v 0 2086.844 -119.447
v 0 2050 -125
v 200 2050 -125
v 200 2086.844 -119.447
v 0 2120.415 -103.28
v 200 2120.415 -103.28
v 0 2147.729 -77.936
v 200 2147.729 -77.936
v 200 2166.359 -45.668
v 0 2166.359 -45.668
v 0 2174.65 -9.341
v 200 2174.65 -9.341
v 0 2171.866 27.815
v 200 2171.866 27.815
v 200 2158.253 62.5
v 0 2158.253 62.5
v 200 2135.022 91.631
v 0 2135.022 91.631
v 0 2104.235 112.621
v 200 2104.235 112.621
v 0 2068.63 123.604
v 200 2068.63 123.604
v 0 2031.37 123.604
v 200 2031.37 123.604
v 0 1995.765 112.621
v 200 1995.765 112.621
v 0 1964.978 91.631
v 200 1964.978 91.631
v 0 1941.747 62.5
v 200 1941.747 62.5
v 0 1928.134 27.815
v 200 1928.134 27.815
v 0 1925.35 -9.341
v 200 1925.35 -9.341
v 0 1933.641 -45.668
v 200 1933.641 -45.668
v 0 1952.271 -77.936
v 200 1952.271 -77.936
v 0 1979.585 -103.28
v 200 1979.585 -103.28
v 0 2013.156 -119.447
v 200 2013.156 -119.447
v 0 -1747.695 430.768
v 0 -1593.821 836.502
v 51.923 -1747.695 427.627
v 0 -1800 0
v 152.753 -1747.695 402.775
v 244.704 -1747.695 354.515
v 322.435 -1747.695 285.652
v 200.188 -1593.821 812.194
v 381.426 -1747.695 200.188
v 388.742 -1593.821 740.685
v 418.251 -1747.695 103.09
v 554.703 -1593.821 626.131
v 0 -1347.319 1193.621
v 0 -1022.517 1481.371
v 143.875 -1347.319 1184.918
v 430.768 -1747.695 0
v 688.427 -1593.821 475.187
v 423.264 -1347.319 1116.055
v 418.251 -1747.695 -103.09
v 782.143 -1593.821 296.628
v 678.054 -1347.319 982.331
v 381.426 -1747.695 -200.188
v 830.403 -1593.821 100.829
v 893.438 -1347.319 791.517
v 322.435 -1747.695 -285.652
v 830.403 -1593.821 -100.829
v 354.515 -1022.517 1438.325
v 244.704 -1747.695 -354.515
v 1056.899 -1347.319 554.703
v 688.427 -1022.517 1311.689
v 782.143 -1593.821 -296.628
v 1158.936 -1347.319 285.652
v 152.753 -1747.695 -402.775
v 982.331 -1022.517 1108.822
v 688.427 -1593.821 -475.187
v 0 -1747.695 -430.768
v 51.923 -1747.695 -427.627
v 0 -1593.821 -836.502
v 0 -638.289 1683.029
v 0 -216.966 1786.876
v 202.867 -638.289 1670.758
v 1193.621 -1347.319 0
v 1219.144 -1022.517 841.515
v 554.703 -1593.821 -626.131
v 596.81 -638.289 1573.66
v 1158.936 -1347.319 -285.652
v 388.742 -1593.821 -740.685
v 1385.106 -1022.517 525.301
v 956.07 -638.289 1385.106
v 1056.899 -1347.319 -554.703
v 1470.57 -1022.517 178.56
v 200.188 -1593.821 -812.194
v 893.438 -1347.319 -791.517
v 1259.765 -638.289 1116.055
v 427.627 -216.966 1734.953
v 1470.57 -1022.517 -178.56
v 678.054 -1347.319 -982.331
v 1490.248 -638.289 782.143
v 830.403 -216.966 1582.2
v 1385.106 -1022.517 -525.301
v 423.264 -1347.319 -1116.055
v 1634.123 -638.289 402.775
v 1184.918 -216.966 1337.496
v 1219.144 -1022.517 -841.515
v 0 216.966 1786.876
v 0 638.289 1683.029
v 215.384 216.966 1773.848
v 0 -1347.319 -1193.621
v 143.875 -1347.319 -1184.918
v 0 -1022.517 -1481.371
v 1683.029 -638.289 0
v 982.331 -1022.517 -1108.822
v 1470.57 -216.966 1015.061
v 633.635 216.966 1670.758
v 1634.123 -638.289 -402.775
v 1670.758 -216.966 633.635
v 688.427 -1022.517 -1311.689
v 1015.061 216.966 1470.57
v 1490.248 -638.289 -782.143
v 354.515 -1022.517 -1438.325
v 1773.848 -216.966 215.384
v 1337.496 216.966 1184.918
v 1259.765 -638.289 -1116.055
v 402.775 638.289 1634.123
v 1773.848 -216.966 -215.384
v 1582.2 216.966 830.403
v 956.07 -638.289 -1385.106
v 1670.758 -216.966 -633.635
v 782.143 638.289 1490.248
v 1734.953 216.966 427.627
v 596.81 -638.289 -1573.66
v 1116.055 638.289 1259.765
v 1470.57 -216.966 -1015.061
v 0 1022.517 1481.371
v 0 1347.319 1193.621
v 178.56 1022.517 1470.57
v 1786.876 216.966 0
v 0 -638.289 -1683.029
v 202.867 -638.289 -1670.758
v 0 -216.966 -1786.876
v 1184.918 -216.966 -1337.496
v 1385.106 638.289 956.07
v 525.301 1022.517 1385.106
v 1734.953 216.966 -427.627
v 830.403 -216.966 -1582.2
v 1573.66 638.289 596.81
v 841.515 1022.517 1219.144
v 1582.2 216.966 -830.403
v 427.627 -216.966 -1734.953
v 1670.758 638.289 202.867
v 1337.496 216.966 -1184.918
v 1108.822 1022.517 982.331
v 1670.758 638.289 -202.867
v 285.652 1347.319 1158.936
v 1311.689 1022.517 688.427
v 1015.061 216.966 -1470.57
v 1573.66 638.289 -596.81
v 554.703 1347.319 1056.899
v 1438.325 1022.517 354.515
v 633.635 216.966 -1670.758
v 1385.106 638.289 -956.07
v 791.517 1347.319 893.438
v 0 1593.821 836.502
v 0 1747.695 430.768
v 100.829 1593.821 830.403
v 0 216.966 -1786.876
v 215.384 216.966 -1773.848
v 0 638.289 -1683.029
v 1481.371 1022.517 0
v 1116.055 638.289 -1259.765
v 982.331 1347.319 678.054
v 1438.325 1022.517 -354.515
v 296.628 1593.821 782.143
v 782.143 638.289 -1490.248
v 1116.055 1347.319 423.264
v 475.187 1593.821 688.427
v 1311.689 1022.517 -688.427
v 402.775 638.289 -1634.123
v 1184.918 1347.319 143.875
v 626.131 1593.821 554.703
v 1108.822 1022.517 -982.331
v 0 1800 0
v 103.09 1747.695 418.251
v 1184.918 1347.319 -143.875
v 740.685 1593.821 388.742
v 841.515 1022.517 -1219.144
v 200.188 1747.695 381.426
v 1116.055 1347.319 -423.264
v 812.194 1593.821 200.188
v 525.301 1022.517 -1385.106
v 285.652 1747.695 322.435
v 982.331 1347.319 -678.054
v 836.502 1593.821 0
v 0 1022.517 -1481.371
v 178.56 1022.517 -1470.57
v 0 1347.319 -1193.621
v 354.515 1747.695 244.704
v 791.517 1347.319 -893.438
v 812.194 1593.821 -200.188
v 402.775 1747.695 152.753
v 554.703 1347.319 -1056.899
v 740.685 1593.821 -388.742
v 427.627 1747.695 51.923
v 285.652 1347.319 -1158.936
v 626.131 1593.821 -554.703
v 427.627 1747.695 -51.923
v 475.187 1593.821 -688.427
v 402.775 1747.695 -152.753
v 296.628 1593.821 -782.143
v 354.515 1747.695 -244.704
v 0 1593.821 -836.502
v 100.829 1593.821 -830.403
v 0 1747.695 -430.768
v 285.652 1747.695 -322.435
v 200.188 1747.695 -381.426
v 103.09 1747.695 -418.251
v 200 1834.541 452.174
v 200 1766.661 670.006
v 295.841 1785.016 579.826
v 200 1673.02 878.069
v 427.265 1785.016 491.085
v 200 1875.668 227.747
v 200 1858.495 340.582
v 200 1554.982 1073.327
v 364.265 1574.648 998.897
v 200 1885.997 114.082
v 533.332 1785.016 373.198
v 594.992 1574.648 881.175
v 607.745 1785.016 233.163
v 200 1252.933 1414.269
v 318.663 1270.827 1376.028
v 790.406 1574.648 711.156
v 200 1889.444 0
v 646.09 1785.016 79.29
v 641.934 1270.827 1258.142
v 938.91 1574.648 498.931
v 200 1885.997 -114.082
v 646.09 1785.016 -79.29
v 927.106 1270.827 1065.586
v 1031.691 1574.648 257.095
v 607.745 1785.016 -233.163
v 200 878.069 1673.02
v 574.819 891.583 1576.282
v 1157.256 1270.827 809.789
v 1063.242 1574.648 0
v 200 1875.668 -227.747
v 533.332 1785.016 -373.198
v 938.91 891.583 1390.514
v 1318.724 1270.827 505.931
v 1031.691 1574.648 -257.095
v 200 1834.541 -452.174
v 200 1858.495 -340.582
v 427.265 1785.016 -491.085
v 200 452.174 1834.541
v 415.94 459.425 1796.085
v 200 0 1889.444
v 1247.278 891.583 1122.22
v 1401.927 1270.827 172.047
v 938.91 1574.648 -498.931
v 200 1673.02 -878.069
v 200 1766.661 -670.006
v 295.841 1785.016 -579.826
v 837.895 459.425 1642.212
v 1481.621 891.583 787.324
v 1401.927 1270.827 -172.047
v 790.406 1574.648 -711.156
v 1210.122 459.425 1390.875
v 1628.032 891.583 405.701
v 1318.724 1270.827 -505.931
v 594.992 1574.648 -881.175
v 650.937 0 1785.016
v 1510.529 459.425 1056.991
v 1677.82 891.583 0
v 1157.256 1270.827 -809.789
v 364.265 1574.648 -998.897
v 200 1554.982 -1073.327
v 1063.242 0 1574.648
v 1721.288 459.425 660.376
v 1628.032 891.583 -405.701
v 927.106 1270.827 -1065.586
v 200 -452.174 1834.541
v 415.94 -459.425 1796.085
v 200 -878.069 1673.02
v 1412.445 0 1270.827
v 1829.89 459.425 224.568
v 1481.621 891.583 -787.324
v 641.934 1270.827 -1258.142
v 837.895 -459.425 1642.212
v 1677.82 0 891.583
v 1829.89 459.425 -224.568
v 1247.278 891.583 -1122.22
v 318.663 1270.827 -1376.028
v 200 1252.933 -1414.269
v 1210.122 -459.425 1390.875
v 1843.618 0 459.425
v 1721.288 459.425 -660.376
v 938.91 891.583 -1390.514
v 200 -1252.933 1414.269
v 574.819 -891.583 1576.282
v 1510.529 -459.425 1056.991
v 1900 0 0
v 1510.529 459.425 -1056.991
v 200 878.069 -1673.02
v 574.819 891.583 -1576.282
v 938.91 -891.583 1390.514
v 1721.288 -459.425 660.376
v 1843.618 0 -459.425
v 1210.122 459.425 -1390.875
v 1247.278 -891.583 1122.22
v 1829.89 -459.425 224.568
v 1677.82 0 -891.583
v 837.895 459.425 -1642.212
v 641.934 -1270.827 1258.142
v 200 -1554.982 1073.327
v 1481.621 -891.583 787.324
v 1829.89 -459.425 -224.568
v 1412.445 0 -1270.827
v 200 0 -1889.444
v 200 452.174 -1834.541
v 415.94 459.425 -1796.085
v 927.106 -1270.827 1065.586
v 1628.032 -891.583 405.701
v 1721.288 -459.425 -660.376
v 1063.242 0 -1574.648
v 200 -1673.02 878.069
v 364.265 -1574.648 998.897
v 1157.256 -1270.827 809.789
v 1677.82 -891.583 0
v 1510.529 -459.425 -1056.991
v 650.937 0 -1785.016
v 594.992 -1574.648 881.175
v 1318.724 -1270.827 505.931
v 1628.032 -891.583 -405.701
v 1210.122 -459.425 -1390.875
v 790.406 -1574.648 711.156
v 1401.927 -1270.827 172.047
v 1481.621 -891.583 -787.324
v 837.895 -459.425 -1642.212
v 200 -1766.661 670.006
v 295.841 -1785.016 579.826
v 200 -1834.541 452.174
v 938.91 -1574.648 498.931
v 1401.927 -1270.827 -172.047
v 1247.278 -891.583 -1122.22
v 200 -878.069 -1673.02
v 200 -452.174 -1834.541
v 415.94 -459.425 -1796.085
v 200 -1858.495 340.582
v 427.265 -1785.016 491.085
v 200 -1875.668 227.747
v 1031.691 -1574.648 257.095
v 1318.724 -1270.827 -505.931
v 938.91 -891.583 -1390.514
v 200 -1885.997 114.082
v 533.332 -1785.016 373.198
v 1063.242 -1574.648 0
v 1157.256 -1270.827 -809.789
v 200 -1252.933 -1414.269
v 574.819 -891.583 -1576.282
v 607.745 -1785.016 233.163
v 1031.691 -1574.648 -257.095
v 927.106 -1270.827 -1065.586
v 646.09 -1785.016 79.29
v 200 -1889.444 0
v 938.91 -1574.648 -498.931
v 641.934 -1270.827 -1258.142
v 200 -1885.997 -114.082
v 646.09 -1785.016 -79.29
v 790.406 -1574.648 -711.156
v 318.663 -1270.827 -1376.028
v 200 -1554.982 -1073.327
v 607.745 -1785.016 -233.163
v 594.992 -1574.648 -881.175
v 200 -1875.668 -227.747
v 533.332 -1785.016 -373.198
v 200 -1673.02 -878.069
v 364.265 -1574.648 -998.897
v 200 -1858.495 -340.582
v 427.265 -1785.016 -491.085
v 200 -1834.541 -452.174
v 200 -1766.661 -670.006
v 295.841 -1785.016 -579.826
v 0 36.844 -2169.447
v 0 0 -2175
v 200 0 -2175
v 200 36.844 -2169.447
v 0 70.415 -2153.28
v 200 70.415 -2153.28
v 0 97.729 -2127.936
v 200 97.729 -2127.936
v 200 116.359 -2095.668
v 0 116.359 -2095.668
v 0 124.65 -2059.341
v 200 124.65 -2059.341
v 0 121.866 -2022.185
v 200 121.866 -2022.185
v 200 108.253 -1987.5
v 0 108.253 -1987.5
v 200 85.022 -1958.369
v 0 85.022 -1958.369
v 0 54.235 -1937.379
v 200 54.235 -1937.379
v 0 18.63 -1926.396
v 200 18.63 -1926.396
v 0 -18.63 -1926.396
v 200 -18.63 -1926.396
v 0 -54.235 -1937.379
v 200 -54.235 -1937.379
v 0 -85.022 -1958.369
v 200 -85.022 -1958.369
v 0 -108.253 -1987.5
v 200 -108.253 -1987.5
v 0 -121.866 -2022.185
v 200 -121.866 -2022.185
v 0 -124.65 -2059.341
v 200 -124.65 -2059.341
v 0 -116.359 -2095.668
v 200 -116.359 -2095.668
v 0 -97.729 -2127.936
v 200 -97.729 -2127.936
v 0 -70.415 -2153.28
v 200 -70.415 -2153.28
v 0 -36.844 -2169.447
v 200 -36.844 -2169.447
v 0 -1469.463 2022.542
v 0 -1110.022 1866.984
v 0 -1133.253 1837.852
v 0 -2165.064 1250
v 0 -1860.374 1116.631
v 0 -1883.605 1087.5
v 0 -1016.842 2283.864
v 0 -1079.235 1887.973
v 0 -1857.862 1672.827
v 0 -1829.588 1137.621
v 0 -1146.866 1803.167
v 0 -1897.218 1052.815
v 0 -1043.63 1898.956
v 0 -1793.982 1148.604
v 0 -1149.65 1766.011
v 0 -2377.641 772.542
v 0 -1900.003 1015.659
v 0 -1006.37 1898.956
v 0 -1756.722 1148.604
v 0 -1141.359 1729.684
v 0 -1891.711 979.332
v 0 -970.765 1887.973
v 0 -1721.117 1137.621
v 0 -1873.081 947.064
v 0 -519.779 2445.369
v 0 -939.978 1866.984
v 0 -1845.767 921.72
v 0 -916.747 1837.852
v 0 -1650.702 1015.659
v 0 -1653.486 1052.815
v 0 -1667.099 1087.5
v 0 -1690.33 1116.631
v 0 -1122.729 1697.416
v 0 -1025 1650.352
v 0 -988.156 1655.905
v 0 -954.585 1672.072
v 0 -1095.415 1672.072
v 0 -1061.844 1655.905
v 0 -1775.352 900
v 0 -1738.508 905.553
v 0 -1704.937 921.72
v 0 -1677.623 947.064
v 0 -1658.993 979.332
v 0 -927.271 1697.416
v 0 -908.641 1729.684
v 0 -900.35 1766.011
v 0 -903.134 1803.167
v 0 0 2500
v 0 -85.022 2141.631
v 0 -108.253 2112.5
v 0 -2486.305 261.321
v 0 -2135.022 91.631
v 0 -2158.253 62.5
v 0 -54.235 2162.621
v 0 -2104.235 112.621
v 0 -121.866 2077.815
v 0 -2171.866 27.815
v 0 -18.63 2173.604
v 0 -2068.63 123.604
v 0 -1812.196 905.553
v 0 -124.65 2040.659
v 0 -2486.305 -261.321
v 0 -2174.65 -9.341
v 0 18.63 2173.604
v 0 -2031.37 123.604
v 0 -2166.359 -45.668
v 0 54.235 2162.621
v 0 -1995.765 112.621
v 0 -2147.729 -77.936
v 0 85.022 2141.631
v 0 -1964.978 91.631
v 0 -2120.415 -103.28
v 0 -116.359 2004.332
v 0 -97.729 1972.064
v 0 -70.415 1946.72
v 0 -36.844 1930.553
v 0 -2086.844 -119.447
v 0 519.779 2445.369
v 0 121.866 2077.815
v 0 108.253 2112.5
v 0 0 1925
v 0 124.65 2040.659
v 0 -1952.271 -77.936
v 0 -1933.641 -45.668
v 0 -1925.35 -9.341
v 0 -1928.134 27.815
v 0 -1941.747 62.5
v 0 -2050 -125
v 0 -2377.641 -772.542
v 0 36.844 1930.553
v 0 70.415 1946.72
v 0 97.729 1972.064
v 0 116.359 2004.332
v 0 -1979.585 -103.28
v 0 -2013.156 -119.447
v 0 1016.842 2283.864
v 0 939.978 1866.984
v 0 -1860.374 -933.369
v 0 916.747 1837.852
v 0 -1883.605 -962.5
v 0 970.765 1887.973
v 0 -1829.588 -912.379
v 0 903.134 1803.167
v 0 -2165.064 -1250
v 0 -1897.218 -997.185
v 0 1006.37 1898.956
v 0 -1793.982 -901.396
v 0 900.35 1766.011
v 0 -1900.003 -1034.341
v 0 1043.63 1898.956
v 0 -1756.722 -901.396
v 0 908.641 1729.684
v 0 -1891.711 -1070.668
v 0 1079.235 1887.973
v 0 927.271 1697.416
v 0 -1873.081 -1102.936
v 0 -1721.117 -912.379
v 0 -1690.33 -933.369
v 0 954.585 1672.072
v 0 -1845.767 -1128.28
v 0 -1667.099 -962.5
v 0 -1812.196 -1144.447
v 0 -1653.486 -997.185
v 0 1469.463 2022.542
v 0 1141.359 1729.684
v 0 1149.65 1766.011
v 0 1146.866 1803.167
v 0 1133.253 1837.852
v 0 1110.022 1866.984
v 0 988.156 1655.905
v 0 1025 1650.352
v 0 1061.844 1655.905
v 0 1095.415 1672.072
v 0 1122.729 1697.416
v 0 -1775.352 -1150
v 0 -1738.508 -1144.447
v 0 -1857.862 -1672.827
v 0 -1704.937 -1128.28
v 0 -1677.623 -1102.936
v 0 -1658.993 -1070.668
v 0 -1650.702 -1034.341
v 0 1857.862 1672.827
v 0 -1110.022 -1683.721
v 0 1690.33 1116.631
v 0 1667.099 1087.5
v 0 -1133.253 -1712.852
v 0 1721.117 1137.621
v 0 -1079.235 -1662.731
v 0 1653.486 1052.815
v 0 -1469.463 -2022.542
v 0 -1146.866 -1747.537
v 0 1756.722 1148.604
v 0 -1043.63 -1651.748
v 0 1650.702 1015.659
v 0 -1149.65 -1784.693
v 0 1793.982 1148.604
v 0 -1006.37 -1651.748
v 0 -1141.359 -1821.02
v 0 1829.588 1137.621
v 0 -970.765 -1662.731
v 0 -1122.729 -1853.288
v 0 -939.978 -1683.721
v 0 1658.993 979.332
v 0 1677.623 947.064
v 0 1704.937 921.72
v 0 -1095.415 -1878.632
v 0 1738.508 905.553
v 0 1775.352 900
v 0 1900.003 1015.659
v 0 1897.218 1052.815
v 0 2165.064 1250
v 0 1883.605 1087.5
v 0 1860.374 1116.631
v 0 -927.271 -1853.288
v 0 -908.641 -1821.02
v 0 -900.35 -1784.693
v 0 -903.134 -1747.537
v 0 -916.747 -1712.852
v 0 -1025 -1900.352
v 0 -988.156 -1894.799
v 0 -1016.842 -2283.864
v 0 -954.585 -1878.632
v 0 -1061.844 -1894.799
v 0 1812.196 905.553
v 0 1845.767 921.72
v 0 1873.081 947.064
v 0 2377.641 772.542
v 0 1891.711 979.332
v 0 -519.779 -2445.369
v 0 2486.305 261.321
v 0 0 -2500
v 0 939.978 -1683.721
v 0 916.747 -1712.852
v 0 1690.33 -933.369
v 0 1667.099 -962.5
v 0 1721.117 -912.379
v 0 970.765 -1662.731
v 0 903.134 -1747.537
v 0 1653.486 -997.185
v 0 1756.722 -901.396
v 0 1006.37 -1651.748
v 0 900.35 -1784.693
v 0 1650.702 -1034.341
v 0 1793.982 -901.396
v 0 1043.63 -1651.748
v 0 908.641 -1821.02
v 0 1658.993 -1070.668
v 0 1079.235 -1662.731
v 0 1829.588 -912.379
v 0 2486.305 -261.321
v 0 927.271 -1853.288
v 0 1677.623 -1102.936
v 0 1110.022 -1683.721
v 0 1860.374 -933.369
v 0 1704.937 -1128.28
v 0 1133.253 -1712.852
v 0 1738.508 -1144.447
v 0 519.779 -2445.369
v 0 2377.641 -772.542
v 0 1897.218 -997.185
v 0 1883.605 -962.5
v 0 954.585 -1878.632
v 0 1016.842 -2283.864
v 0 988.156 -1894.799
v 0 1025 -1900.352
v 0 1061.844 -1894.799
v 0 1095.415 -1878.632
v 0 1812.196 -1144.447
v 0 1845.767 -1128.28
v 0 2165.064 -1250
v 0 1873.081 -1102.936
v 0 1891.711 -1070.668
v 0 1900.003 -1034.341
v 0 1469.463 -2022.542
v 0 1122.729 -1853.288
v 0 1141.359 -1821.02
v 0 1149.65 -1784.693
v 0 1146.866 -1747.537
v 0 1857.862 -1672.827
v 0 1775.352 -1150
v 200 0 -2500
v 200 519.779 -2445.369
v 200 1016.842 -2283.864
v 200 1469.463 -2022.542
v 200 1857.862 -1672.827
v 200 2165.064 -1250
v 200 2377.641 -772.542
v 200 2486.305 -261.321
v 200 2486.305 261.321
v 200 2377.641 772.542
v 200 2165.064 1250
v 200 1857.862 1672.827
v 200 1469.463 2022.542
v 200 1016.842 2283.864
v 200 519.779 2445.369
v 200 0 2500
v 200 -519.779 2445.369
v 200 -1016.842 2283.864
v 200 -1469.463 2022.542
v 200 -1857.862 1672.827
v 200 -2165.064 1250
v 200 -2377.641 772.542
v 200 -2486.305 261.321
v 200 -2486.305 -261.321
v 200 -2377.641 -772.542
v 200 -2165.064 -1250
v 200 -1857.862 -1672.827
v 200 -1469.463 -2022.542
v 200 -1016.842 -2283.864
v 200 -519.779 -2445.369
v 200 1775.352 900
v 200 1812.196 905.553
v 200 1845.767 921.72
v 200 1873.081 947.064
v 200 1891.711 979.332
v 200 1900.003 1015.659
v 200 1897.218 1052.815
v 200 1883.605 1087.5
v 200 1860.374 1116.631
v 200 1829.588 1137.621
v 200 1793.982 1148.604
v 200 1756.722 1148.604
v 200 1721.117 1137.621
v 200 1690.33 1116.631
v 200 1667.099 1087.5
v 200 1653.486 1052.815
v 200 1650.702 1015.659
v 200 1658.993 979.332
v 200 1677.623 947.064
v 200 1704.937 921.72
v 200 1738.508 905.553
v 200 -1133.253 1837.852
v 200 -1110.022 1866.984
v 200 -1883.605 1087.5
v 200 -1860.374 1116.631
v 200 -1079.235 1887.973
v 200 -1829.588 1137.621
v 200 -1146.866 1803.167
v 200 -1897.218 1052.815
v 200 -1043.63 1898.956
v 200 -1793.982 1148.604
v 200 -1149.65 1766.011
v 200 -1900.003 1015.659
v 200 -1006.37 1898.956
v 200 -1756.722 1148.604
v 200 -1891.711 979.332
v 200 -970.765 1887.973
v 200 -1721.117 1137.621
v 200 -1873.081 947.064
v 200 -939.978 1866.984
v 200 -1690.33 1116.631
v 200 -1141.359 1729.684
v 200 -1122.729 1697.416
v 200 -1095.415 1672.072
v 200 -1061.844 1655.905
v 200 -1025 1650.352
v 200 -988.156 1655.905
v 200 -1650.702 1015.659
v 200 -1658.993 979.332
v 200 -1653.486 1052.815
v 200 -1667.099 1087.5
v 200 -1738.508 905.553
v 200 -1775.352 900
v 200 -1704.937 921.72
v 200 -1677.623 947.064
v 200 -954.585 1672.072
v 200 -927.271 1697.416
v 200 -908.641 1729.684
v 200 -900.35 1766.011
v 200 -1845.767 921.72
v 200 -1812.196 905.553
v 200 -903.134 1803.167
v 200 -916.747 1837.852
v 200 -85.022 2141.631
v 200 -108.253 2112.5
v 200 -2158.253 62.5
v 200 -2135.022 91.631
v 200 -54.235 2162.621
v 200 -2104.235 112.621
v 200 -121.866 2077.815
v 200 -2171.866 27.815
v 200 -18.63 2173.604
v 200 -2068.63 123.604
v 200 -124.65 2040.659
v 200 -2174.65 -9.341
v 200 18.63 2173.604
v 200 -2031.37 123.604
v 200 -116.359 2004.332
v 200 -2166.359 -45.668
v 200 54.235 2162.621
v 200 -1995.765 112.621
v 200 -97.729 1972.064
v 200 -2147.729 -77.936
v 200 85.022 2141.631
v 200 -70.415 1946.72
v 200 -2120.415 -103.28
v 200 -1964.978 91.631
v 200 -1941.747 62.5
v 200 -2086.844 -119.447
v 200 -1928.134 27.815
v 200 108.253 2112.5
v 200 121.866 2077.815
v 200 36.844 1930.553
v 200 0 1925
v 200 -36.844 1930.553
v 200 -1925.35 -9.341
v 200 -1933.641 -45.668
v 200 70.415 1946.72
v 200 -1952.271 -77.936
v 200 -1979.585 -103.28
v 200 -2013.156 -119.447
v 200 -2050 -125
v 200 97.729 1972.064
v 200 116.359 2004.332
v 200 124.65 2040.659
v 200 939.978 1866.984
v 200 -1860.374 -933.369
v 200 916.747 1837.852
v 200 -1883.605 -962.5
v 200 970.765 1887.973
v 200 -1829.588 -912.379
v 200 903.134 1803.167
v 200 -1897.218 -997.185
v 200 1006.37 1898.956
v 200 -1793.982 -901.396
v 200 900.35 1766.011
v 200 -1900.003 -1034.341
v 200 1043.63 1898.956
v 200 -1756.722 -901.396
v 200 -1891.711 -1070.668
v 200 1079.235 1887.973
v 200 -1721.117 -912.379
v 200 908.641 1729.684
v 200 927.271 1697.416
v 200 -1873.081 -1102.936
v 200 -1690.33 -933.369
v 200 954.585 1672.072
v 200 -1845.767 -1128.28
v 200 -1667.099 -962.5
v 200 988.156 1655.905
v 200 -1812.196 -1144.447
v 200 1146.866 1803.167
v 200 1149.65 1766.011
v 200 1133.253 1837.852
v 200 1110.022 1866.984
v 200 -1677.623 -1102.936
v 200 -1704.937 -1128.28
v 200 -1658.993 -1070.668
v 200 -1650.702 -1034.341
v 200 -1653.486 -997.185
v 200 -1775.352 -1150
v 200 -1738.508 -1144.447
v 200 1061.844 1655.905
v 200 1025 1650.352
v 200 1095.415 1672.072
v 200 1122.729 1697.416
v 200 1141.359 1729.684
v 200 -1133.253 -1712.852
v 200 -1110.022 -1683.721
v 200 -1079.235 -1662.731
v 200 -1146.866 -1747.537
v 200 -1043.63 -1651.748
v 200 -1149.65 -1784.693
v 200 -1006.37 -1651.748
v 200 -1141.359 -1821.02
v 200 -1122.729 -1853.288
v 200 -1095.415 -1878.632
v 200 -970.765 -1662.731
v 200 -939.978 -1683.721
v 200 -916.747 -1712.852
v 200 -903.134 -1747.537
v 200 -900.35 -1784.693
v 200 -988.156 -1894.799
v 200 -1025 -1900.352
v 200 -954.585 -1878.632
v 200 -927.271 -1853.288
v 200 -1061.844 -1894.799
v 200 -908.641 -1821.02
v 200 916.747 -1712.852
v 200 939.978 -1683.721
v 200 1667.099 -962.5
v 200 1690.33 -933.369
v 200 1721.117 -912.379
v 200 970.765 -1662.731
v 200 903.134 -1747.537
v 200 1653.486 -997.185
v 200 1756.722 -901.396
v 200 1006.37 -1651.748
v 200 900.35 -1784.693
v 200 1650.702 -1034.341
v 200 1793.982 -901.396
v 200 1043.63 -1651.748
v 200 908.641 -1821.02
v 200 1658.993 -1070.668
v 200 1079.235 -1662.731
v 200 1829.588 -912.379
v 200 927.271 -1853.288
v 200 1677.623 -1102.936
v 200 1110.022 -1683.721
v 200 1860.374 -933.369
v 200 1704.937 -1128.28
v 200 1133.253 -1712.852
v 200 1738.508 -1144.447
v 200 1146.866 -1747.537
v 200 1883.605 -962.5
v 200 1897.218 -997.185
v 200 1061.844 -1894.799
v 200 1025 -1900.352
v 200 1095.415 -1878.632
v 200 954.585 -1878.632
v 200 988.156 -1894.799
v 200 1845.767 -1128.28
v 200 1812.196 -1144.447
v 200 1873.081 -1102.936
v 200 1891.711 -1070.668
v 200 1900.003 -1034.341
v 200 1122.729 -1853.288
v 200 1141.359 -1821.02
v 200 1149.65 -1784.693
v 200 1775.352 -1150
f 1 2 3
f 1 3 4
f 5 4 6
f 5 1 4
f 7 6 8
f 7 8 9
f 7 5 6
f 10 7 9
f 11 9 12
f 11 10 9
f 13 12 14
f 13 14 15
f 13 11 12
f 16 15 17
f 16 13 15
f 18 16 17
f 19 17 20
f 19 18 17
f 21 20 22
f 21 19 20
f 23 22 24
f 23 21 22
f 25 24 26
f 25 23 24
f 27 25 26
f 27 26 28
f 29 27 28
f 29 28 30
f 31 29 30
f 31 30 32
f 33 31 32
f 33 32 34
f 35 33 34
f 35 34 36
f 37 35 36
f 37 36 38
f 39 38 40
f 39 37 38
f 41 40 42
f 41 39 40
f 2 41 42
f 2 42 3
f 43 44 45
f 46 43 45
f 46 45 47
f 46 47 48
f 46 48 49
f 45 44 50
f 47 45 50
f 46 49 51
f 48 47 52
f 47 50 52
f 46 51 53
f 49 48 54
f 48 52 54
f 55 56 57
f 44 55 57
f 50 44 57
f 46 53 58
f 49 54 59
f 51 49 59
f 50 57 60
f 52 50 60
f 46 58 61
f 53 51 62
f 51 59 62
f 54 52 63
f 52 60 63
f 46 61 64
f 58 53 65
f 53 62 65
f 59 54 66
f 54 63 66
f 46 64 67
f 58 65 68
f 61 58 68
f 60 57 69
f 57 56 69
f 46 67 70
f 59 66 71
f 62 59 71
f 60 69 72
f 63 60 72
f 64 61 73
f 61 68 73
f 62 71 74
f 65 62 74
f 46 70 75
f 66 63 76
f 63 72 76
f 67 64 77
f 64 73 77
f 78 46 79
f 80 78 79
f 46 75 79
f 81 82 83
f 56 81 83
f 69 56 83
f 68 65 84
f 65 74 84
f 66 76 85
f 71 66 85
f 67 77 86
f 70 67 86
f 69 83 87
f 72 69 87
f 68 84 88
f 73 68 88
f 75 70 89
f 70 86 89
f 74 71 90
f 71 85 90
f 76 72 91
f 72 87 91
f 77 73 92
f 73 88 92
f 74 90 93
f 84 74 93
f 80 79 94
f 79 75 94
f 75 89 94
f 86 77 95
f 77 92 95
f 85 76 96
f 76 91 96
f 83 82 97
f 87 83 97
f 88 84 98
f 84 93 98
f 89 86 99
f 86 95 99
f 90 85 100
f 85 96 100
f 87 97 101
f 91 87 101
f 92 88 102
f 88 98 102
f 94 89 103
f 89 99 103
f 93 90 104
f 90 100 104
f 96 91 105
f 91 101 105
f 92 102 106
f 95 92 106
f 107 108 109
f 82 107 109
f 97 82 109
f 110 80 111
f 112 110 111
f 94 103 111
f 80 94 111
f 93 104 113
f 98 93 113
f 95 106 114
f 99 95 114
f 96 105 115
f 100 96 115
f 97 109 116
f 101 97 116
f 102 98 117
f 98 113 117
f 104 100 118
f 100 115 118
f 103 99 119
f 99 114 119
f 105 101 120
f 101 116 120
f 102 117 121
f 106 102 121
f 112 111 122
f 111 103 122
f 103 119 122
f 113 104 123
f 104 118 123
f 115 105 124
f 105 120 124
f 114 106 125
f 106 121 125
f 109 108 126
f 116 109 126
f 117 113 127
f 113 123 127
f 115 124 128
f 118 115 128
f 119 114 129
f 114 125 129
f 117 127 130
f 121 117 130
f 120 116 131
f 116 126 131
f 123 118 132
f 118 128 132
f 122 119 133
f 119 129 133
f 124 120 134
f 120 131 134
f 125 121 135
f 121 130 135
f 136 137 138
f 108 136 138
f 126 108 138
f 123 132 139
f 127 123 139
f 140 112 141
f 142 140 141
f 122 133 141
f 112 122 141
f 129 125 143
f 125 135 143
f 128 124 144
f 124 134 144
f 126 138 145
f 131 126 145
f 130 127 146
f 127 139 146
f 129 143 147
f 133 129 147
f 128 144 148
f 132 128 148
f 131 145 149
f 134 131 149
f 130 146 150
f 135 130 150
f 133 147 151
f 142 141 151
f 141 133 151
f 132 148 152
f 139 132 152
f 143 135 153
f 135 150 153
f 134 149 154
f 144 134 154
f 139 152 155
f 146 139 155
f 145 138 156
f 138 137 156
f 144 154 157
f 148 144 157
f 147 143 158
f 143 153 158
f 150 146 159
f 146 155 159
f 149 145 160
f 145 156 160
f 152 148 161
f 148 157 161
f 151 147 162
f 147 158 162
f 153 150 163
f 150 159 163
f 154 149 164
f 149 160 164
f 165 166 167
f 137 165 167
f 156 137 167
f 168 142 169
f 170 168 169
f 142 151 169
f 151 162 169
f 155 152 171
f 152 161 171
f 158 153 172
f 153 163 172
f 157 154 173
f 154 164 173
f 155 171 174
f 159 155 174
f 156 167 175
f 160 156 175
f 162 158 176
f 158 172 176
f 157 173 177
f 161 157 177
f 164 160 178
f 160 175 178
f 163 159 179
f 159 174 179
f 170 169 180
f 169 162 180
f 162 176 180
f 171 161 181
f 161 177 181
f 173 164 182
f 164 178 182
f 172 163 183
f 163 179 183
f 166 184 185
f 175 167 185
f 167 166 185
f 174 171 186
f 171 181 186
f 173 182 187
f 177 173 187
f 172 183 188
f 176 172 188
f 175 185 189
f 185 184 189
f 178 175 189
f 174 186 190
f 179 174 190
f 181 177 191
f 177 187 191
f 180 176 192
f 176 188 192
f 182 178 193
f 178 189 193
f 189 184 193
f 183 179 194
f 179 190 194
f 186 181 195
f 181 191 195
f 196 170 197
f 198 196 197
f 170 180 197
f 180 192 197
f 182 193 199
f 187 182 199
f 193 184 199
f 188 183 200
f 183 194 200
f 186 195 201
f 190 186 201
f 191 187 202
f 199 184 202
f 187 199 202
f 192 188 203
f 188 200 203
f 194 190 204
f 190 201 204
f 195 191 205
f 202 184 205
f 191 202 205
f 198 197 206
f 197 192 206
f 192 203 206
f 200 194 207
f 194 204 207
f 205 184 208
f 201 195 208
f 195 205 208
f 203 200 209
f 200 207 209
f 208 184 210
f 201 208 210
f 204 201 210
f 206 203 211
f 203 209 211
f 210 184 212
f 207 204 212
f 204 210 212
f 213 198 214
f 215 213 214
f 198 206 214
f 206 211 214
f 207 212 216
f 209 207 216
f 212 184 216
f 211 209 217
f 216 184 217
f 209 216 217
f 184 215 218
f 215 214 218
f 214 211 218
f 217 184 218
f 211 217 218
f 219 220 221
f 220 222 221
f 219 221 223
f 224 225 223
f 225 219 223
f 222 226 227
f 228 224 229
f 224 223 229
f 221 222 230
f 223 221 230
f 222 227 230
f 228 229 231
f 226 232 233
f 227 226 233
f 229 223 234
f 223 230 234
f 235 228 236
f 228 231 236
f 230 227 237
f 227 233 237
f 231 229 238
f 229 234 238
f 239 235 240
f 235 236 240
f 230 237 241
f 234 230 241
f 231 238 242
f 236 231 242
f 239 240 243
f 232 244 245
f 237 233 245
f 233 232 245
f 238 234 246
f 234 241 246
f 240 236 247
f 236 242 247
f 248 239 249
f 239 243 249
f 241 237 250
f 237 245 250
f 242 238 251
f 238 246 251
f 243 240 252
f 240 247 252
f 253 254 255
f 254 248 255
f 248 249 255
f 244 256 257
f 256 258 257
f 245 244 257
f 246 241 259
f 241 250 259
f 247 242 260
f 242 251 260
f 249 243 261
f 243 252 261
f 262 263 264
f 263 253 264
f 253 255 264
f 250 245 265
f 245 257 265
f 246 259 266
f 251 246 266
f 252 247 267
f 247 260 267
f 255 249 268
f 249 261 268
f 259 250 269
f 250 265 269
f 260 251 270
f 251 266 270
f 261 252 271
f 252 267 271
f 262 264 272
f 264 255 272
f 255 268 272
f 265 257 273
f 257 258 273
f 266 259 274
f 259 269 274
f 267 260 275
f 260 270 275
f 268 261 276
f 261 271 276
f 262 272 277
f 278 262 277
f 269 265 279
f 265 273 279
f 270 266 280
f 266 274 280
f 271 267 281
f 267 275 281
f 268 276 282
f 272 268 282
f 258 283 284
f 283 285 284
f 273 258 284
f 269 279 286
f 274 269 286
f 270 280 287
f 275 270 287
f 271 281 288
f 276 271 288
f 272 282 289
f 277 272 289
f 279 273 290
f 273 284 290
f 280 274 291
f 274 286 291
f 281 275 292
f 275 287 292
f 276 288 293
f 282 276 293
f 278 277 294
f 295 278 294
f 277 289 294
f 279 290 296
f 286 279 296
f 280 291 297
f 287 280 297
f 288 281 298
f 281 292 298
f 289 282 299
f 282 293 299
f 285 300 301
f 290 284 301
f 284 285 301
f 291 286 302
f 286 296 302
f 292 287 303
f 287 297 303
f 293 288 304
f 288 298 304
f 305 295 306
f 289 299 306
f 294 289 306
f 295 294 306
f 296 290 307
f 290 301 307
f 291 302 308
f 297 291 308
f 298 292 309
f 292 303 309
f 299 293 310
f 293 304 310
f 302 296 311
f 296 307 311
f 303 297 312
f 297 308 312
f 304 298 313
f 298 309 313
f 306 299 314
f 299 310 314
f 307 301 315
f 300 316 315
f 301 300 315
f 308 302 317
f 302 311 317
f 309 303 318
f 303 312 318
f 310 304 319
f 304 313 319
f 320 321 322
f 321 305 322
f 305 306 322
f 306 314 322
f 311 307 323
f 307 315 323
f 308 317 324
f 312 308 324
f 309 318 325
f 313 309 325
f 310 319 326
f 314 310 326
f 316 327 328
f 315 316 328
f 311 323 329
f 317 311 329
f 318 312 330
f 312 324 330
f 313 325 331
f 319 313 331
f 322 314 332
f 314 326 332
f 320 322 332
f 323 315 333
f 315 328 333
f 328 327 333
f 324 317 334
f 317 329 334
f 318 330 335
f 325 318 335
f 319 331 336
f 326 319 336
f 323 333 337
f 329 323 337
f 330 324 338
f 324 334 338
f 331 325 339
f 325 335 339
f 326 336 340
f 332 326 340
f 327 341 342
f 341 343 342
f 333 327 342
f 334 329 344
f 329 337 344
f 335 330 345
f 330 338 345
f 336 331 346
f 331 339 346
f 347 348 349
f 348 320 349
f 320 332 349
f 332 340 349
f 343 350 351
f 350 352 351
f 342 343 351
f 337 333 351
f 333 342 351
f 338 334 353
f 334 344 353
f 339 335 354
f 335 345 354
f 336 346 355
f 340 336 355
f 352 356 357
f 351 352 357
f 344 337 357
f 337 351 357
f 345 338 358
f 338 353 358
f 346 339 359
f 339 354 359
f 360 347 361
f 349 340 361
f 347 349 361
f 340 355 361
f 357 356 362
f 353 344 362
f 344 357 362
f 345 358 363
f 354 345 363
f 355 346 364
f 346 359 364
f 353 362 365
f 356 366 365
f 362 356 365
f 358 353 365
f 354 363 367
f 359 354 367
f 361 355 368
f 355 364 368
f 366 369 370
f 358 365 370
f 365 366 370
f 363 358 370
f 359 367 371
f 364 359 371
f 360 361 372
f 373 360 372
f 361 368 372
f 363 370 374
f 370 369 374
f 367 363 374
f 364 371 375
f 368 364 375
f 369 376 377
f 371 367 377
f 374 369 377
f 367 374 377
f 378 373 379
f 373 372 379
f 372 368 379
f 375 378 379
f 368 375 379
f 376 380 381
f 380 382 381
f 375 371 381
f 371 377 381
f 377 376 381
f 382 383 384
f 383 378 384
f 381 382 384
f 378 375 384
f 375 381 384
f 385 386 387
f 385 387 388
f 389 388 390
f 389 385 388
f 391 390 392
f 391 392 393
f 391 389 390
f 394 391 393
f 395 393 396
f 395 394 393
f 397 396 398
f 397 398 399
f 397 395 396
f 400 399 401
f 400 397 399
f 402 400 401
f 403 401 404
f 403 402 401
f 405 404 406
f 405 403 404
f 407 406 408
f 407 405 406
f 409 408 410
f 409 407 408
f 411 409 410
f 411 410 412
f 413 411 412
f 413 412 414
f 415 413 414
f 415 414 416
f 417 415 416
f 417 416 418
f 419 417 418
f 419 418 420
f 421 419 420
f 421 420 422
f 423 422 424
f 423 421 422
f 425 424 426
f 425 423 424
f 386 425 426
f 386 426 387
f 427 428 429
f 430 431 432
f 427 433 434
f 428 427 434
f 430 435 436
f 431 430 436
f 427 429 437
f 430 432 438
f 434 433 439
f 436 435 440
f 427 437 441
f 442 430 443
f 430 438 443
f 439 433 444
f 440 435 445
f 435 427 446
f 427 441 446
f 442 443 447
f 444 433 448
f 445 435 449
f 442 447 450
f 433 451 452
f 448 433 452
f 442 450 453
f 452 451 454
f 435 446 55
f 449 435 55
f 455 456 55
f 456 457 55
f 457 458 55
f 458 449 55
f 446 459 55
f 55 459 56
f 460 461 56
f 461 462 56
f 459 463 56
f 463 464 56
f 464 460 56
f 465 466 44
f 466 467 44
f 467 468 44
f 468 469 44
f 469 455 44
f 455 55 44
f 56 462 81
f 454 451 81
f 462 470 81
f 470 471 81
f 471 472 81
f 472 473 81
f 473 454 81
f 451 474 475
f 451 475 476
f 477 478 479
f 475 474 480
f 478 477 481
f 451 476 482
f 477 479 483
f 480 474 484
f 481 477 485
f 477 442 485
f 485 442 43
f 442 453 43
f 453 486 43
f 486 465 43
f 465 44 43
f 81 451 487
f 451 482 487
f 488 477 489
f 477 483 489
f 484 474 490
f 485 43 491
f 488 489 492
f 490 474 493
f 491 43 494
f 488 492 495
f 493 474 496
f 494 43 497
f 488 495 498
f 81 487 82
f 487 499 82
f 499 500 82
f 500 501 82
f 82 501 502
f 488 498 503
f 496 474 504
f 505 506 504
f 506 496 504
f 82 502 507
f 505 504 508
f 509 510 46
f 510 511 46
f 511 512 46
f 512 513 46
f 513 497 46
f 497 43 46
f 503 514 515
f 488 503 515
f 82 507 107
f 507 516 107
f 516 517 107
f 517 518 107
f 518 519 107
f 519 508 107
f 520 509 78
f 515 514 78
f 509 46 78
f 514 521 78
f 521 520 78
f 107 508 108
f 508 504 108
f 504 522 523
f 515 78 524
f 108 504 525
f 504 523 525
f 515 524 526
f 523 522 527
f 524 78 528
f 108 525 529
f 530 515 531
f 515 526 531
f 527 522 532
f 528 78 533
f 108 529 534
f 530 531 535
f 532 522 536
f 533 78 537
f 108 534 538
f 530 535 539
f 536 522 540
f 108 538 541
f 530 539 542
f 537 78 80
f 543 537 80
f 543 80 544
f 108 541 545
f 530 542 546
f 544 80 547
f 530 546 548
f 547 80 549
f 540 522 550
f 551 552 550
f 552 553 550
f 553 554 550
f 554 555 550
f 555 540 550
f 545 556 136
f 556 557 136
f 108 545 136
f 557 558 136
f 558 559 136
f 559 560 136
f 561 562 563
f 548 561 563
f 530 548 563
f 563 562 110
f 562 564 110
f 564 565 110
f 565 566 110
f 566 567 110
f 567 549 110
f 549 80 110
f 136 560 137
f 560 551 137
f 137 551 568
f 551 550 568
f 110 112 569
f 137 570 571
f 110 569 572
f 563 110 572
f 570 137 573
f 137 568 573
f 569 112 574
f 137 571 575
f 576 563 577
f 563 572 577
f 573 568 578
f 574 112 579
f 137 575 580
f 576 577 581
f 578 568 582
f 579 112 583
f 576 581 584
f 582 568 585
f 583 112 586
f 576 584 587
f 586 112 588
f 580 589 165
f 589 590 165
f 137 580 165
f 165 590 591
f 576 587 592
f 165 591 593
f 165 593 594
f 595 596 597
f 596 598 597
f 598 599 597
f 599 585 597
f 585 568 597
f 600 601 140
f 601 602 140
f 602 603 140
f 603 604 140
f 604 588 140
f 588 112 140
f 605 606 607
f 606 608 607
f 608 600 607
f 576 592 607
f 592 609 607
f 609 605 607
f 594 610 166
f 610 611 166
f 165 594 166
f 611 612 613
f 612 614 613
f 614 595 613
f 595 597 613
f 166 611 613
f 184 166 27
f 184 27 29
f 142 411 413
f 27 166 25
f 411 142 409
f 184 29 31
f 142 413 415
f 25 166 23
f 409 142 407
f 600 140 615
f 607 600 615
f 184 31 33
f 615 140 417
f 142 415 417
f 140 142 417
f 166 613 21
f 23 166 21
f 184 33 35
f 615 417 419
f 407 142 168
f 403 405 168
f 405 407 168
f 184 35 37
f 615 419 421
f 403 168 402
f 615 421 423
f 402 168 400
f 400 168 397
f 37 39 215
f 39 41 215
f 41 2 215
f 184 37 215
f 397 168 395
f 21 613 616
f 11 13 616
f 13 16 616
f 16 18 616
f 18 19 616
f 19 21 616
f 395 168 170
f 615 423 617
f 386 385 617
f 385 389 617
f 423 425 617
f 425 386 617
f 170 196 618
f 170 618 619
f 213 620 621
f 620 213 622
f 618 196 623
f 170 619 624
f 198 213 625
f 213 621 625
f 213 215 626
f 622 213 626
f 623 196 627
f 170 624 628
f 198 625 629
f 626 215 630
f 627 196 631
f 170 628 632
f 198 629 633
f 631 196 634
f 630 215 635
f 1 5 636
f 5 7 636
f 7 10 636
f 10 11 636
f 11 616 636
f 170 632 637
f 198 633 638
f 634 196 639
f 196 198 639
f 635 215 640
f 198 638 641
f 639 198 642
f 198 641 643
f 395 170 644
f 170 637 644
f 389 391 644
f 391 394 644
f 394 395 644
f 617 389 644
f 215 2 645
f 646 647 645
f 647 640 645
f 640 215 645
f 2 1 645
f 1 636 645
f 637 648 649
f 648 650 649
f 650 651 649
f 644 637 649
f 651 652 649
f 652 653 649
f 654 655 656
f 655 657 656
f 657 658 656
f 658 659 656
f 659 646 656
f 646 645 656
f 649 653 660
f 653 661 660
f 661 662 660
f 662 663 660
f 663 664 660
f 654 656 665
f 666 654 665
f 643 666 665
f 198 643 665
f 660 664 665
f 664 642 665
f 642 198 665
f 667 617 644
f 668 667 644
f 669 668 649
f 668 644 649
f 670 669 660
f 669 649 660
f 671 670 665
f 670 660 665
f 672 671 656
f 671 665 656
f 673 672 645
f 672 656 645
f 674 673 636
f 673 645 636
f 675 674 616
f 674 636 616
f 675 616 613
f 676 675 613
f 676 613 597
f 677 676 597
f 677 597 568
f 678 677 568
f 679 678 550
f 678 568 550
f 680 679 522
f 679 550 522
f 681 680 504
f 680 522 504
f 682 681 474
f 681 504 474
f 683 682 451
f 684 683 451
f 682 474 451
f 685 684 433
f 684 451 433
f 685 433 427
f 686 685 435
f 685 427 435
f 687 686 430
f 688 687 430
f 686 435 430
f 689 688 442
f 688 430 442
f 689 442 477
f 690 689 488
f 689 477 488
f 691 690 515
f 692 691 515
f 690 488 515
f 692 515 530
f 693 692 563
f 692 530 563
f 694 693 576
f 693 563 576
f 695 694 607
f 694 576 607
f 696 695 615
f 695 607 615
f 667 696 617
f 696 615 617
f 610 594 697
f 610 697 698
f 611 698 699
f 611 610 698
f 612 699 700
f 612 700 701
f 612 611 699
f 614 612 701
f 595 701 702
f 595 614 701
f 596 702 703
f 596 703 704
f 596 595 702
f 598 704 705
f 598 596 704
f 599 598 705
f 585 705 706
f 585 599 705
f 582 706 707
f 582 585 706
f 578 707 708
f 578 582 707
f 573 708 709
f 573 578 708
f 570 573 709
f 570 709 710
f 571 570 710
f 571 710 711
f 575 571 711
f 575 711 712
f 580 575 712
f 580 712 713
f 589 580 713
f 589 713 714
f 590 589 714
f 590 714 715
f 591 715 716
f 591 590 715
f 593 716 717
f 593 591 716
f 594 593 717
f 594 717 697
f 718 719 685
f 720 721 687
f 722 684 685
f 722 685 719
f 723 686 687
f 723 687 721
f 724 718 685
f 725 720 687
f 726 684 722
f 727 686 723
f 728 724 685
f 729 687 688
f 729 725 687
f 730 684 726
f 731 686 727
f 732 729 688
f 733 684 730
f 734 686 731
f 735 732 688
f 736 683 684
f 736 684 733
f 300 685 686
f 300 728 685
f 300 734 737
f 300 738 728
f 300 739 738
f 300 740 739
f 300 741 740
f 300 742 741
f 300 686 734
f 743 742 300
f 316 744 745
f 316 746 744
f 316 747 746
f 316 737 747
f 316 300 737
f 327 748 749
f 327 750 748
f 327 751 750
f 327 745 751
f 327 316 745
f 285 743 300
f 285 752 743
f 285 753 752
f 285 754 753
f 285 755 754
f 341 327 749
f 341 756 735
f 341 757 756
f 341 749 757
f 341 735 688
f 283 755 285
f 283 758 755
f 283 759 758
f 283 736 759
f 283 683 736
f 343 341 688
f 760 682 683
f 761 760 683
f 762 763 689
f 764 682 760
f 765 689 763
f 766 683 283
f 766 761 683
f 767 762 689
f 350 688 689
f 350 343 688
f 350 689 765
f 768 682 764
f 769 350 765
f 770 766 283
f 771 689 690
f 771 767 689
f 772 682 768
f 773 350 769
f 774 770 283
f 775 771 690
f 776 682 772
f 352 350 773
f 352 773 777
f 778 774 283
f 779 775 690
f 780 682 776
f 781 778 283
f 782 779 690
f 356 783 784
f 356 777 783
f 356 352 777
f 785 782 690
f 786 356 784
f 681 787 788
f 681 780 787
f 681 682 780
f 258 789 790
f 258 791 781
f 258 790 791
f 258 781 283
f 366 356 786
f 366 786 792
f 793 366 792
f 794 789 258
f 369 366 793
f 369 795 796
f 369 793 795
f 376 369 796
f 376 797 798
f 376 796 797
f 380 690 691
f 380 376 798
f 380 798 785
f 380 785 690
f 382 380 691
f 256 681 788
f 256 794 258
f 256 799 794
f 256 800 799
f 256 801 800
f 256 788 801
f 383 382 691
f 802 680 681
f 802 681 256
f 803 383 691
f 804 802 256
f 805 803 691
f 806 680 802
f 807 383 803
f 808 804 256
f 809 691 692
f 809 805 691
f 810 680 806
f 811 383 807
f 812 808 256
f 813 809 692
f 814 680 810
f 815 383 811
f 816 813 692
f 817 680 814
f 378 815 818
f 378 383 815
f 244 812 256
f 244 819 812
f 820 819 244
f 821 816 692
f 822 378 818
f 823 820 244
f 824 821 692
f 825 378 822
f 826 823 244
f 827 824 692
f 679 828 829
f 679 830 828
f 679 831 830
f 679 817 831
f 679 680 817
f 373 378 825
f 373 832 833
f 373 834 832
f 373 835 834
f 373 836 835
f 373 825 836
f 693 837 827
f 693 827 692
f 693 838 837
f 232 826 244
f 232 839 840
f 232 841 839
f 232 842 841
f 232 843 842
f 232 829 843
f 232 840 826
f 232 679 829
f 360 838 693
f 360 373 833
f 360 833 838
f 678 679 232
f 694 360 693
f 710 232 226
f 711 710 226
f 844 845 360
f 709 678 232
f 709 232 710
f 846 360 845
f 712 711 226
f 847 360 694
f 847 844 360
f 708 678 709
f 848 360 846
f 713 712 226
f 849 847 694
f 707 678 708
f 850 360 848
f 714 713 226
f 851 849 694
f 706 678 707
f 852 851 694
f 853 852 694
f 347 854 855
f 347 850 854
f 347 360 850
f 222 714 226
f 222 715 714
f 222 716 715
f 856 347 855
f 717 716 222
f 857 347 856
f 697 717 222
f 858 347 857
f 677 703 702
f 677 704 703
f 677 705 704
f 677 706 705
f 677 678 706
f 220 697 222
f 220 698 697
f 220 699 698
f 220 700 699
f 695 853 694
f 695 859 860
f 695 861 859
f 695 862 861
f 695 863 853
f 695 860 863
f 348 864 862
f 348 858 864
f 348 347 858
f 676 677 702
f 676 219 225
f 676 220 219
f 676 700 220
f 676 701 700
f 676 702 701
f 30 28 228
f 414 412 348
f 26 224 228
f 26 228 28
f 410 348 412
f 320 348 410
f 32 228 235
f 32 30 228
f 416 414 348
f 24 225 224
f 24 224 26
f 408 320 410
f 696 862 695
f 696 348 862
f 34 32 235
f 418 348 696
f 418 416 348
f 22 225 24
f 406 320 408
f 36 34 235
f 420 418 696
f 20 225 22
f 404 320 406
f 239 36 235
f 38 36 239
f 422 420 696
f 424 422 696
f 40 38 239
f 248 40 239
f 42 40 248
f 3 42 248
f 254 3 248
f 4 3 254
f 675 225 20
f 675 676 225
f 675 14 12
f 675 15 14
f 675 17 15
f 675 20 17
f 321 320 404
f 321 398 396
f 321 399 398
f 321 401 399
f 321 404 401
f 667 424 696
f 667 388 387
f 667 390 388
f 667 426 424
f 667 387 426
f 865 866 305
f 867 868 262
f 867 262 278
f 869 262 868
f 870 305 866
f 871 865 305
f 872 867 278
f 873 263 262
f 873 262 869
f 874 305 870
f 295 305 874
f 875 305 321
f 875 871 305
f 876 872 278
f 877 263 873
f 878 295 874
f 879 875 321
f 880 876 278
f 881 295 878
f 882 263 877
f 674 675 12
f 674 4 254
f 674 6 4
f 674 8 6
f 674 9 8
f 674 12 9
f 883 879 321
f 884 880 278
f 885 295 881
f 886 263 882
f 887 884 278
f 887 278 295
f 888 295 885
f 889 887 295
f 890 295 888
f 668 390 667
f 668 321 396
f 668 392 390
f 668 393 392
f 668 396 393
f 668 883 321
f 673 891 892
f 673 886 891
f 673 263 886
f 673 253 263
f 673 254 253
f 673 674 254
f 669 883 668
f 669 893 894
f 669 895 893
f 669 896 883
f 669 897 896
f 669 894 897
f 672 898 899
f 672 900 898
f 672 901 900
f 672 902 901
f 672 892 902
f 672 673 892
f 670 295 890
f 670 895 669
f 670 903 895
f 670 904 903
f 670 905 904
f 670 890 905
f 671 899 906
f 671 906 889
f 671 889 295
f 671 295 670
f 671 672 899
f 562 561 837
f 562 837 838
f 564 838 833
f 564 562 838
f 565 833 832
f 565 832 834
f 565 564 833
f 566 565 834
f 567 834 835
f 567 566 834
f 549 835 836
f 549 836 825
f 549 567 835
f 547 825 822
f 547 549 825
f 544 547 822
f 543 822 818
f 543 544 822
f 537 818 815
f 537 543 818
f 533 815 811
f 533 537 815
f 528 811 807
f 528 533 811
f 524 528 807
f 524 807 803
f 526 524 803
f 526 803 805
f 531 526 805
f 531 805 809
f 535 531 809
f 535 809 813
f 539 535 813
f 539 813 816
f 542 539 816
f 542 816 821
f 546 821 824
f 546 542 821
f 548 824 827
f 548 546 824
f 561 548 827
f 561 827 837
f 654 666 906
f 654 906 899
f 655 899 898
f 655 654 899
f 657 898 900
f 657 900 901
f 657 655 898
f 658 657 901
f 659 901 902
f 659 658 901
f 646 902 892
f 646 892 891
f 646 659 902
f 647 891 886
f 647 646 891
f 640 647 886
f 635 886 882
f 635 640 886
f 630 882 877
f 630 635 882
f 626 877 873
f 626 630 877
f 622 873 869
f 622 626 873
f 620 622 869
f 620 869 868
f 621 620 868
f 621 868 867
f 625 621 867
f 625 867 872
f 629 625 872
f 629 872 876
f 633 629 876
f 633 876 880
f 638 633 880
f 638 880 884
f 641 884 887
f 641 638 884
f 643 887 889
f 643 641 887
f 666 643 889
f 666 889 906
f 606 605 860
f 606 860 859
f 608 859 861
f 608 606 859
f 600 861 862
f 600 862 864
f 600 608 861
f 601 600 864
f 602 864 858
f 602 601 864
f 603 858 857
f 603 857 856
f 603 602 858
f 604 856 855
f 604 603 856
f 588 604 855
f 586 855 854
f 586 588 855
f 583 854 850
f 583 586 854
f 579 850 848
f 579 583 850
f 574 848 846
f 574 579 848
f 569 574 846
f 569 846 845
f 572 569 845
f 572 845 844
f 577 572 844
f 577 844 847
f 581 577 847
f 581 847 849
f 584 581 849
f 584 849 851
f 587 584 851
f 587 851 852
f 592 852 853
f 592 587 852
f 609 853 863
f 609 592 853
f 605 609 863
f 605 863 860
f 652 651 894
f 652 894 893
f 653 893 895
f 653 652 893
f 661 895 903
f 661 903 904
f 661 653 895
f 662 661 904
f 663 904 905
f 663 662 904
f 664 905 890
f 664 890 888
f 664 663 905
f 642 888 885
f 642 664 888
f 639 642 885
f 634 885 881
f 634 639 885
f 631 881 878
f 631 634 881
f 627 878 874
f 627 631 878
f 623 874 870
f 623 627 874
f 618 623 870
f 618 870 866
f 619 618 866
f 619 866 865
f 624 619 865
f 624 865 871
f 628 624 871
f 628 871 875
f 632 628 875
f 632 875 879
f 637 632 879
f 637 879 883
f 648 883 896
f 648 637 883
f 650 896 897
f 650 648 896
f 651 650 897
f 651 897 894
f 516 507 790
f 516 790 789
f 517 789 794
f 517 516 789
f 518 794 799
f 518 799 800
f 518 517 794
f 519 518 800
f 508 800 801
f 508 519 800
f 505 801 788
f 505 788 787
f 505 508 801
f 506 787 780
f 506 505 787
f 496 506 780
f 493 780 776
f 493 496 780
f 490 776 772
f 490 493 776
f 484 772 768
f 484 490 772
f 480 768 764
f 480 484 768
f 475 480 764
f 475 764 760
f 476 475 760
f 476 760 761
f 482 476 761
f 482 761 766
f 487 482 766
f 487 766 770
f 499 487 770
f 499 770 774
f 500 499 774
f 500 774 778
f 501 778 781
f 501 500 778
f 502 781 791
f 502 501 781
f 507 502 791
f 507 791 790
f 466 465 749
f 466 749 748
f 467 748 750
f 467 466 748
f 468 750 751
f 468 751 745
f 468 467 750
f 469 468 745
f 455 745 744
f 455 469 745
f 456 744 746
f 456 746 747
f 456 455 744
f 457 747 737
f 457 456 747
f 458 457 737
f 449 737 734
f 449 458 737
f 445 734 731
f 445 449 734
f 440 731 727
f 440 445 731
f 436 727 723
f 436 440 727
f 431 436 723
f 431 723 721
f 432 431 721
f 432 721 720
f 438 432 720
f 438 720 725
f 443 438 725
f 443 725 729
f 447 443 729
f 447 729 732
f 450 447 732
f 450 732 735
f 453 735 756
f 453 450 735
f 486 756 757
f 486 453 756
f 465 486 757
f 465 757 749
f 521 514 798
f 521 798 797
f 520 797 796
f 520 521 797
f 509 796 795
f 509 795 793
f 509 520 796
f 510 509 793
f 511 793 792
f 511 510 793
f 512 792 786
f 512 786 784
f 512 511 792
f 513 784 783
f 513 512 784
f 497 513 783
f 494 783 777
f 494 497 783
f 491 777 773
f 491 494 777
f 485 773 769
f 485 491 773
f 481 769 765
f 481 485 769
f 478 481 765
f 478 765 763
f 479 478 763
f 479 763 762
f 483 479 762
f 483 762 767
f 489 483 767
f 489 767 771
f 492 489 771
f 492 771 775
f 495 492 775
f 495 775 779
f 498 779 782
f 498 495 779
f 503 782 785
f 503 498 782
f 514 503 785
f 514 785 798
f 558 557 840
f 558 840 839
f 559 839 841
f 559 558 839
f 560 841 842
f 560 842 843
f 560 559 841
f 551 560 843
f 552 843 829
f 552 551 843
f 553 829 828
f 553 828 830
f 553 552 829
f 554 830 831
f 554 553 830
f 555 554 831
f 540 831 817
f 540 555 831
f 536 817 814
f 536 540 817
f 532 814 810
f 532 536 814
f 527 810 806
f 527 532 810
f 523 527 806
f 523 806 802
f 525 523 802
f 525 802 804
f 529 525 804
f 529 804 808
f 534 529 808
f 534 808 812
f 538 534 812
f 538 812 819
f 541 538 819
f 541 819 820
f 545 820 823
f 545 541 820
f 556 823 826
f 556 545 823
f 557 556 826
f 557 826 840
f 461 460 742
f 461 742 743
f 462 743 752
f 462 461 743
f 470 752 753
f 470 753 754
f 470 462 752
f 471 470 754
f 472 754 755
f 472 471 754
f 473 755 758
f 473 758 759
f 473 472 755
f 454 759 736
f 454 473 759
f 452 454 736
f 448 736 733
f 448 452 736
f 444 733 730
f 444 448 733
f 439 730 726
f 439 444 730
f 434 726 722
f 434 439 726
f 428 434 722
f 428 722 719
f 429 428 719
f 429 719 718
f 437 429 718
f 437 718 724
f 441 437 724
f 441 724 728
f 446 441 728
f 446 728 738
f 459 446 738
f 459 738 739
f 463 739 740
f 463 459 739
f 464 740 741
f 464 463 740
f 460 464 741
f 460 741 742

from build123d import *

# Parameters (mm, degrees)
SKETCH1_R           = 2500
SKETCH1_R_2         = 125
BOSS_EXTRUDE1_DEPTH = 200
SKETCH2_R           = 1800
CUT_EXTRUDE1_DEPTH  = 201
REVOLVE1_ANGLE      = 180


with BuildPart() as part:
    # Sketch1 → Boss-Extrude1 (new body)
    with BuildSketch(Plane(origin=(0, 0, 0), x_dir=(0, 0, -1), z_dir=(1, 0, 0))):
        Circle(SKETCH1_R)
        with Locations((0, 2050)):
            Circle(SKETCH1_R_2, mode=Mode.SUBTRACT)
        with Locations((1025, 1775.352077758)):
            Circle(SKETCH1_R_2, mode=Mode.SUBTRACT)
        with Locations((1775.352077758, 1025)):
            Circle(SKETCH1_R_2, mode=Mode.SUBTRACT)
        with Locations((2050, 0)):
            Circle(SKETCH1_R_2, mode=Mode.SUBTRACT)
        with Locations((1775.352077758, -1025)):
            Circle(SKETCH1_R_2, mode=Mode.SUBTRACT)
        with Locations((1025, -1775.352077758)):
            Circle(SKETCH1_R_2, mode=Mode.SUBTRACT)
        with Locations((0, -2050)):
            Circle(SKETCH1_R_2, mode=Mode.SUBTRACT)
        with Locations((-1025, -1775.352077758)):
            Circle(SKETCH1_R_2, mode=Mode.SUBTRACT)
        with Locations((-1775.352077758, -1025)):
            Circle(SKETCH1_R_2, mode=Mode.SUBTRACT)
        with Locations((-2050, 0)):
            Circle(SKETCH1_R_2, mode=Mode.SUBTRACT)
        with Locations((-1775.352077758, 1025)):
            Circle(SKETCH1_R_2, mode=Mode.SUBTRACT)
        with Locations((-1025, 1775.352077758)):
            Circle(SKETCH1_R_2, mode=Mode.SUBTRACT)
    extrude(amount=BOSS_EXTRUDE1_DEPTH)

    # Sketch2 → Cut-Extrude1 (cut, through all)
    with BuildSketch(Plane.ZY):
        Circle(SKETCH2_R)
    extrude(amount=-CUT_EXTRUDE1_DEPTH, mode=Mode.SUBTRACT)

    # Sketch4 → Revolve1 (revolve)
    with BuildSketch(Plane.ZY):
        with BuildLine():
            Line((0, 1800), (0, 1900))
            ThreePointArc((0, 1900), (1900, 0), (0, -1900))
            Line((0, -1900), (0, -1800))
            ThreePointArc((0, -1800), (1800, 0), (0, 1800))
        make_face()
    revolve(axis=Axis((0, -1900, 0), (0, 1, 0)), revolution_arc=REVOLVE1_ANGLE)


solid = part.part
